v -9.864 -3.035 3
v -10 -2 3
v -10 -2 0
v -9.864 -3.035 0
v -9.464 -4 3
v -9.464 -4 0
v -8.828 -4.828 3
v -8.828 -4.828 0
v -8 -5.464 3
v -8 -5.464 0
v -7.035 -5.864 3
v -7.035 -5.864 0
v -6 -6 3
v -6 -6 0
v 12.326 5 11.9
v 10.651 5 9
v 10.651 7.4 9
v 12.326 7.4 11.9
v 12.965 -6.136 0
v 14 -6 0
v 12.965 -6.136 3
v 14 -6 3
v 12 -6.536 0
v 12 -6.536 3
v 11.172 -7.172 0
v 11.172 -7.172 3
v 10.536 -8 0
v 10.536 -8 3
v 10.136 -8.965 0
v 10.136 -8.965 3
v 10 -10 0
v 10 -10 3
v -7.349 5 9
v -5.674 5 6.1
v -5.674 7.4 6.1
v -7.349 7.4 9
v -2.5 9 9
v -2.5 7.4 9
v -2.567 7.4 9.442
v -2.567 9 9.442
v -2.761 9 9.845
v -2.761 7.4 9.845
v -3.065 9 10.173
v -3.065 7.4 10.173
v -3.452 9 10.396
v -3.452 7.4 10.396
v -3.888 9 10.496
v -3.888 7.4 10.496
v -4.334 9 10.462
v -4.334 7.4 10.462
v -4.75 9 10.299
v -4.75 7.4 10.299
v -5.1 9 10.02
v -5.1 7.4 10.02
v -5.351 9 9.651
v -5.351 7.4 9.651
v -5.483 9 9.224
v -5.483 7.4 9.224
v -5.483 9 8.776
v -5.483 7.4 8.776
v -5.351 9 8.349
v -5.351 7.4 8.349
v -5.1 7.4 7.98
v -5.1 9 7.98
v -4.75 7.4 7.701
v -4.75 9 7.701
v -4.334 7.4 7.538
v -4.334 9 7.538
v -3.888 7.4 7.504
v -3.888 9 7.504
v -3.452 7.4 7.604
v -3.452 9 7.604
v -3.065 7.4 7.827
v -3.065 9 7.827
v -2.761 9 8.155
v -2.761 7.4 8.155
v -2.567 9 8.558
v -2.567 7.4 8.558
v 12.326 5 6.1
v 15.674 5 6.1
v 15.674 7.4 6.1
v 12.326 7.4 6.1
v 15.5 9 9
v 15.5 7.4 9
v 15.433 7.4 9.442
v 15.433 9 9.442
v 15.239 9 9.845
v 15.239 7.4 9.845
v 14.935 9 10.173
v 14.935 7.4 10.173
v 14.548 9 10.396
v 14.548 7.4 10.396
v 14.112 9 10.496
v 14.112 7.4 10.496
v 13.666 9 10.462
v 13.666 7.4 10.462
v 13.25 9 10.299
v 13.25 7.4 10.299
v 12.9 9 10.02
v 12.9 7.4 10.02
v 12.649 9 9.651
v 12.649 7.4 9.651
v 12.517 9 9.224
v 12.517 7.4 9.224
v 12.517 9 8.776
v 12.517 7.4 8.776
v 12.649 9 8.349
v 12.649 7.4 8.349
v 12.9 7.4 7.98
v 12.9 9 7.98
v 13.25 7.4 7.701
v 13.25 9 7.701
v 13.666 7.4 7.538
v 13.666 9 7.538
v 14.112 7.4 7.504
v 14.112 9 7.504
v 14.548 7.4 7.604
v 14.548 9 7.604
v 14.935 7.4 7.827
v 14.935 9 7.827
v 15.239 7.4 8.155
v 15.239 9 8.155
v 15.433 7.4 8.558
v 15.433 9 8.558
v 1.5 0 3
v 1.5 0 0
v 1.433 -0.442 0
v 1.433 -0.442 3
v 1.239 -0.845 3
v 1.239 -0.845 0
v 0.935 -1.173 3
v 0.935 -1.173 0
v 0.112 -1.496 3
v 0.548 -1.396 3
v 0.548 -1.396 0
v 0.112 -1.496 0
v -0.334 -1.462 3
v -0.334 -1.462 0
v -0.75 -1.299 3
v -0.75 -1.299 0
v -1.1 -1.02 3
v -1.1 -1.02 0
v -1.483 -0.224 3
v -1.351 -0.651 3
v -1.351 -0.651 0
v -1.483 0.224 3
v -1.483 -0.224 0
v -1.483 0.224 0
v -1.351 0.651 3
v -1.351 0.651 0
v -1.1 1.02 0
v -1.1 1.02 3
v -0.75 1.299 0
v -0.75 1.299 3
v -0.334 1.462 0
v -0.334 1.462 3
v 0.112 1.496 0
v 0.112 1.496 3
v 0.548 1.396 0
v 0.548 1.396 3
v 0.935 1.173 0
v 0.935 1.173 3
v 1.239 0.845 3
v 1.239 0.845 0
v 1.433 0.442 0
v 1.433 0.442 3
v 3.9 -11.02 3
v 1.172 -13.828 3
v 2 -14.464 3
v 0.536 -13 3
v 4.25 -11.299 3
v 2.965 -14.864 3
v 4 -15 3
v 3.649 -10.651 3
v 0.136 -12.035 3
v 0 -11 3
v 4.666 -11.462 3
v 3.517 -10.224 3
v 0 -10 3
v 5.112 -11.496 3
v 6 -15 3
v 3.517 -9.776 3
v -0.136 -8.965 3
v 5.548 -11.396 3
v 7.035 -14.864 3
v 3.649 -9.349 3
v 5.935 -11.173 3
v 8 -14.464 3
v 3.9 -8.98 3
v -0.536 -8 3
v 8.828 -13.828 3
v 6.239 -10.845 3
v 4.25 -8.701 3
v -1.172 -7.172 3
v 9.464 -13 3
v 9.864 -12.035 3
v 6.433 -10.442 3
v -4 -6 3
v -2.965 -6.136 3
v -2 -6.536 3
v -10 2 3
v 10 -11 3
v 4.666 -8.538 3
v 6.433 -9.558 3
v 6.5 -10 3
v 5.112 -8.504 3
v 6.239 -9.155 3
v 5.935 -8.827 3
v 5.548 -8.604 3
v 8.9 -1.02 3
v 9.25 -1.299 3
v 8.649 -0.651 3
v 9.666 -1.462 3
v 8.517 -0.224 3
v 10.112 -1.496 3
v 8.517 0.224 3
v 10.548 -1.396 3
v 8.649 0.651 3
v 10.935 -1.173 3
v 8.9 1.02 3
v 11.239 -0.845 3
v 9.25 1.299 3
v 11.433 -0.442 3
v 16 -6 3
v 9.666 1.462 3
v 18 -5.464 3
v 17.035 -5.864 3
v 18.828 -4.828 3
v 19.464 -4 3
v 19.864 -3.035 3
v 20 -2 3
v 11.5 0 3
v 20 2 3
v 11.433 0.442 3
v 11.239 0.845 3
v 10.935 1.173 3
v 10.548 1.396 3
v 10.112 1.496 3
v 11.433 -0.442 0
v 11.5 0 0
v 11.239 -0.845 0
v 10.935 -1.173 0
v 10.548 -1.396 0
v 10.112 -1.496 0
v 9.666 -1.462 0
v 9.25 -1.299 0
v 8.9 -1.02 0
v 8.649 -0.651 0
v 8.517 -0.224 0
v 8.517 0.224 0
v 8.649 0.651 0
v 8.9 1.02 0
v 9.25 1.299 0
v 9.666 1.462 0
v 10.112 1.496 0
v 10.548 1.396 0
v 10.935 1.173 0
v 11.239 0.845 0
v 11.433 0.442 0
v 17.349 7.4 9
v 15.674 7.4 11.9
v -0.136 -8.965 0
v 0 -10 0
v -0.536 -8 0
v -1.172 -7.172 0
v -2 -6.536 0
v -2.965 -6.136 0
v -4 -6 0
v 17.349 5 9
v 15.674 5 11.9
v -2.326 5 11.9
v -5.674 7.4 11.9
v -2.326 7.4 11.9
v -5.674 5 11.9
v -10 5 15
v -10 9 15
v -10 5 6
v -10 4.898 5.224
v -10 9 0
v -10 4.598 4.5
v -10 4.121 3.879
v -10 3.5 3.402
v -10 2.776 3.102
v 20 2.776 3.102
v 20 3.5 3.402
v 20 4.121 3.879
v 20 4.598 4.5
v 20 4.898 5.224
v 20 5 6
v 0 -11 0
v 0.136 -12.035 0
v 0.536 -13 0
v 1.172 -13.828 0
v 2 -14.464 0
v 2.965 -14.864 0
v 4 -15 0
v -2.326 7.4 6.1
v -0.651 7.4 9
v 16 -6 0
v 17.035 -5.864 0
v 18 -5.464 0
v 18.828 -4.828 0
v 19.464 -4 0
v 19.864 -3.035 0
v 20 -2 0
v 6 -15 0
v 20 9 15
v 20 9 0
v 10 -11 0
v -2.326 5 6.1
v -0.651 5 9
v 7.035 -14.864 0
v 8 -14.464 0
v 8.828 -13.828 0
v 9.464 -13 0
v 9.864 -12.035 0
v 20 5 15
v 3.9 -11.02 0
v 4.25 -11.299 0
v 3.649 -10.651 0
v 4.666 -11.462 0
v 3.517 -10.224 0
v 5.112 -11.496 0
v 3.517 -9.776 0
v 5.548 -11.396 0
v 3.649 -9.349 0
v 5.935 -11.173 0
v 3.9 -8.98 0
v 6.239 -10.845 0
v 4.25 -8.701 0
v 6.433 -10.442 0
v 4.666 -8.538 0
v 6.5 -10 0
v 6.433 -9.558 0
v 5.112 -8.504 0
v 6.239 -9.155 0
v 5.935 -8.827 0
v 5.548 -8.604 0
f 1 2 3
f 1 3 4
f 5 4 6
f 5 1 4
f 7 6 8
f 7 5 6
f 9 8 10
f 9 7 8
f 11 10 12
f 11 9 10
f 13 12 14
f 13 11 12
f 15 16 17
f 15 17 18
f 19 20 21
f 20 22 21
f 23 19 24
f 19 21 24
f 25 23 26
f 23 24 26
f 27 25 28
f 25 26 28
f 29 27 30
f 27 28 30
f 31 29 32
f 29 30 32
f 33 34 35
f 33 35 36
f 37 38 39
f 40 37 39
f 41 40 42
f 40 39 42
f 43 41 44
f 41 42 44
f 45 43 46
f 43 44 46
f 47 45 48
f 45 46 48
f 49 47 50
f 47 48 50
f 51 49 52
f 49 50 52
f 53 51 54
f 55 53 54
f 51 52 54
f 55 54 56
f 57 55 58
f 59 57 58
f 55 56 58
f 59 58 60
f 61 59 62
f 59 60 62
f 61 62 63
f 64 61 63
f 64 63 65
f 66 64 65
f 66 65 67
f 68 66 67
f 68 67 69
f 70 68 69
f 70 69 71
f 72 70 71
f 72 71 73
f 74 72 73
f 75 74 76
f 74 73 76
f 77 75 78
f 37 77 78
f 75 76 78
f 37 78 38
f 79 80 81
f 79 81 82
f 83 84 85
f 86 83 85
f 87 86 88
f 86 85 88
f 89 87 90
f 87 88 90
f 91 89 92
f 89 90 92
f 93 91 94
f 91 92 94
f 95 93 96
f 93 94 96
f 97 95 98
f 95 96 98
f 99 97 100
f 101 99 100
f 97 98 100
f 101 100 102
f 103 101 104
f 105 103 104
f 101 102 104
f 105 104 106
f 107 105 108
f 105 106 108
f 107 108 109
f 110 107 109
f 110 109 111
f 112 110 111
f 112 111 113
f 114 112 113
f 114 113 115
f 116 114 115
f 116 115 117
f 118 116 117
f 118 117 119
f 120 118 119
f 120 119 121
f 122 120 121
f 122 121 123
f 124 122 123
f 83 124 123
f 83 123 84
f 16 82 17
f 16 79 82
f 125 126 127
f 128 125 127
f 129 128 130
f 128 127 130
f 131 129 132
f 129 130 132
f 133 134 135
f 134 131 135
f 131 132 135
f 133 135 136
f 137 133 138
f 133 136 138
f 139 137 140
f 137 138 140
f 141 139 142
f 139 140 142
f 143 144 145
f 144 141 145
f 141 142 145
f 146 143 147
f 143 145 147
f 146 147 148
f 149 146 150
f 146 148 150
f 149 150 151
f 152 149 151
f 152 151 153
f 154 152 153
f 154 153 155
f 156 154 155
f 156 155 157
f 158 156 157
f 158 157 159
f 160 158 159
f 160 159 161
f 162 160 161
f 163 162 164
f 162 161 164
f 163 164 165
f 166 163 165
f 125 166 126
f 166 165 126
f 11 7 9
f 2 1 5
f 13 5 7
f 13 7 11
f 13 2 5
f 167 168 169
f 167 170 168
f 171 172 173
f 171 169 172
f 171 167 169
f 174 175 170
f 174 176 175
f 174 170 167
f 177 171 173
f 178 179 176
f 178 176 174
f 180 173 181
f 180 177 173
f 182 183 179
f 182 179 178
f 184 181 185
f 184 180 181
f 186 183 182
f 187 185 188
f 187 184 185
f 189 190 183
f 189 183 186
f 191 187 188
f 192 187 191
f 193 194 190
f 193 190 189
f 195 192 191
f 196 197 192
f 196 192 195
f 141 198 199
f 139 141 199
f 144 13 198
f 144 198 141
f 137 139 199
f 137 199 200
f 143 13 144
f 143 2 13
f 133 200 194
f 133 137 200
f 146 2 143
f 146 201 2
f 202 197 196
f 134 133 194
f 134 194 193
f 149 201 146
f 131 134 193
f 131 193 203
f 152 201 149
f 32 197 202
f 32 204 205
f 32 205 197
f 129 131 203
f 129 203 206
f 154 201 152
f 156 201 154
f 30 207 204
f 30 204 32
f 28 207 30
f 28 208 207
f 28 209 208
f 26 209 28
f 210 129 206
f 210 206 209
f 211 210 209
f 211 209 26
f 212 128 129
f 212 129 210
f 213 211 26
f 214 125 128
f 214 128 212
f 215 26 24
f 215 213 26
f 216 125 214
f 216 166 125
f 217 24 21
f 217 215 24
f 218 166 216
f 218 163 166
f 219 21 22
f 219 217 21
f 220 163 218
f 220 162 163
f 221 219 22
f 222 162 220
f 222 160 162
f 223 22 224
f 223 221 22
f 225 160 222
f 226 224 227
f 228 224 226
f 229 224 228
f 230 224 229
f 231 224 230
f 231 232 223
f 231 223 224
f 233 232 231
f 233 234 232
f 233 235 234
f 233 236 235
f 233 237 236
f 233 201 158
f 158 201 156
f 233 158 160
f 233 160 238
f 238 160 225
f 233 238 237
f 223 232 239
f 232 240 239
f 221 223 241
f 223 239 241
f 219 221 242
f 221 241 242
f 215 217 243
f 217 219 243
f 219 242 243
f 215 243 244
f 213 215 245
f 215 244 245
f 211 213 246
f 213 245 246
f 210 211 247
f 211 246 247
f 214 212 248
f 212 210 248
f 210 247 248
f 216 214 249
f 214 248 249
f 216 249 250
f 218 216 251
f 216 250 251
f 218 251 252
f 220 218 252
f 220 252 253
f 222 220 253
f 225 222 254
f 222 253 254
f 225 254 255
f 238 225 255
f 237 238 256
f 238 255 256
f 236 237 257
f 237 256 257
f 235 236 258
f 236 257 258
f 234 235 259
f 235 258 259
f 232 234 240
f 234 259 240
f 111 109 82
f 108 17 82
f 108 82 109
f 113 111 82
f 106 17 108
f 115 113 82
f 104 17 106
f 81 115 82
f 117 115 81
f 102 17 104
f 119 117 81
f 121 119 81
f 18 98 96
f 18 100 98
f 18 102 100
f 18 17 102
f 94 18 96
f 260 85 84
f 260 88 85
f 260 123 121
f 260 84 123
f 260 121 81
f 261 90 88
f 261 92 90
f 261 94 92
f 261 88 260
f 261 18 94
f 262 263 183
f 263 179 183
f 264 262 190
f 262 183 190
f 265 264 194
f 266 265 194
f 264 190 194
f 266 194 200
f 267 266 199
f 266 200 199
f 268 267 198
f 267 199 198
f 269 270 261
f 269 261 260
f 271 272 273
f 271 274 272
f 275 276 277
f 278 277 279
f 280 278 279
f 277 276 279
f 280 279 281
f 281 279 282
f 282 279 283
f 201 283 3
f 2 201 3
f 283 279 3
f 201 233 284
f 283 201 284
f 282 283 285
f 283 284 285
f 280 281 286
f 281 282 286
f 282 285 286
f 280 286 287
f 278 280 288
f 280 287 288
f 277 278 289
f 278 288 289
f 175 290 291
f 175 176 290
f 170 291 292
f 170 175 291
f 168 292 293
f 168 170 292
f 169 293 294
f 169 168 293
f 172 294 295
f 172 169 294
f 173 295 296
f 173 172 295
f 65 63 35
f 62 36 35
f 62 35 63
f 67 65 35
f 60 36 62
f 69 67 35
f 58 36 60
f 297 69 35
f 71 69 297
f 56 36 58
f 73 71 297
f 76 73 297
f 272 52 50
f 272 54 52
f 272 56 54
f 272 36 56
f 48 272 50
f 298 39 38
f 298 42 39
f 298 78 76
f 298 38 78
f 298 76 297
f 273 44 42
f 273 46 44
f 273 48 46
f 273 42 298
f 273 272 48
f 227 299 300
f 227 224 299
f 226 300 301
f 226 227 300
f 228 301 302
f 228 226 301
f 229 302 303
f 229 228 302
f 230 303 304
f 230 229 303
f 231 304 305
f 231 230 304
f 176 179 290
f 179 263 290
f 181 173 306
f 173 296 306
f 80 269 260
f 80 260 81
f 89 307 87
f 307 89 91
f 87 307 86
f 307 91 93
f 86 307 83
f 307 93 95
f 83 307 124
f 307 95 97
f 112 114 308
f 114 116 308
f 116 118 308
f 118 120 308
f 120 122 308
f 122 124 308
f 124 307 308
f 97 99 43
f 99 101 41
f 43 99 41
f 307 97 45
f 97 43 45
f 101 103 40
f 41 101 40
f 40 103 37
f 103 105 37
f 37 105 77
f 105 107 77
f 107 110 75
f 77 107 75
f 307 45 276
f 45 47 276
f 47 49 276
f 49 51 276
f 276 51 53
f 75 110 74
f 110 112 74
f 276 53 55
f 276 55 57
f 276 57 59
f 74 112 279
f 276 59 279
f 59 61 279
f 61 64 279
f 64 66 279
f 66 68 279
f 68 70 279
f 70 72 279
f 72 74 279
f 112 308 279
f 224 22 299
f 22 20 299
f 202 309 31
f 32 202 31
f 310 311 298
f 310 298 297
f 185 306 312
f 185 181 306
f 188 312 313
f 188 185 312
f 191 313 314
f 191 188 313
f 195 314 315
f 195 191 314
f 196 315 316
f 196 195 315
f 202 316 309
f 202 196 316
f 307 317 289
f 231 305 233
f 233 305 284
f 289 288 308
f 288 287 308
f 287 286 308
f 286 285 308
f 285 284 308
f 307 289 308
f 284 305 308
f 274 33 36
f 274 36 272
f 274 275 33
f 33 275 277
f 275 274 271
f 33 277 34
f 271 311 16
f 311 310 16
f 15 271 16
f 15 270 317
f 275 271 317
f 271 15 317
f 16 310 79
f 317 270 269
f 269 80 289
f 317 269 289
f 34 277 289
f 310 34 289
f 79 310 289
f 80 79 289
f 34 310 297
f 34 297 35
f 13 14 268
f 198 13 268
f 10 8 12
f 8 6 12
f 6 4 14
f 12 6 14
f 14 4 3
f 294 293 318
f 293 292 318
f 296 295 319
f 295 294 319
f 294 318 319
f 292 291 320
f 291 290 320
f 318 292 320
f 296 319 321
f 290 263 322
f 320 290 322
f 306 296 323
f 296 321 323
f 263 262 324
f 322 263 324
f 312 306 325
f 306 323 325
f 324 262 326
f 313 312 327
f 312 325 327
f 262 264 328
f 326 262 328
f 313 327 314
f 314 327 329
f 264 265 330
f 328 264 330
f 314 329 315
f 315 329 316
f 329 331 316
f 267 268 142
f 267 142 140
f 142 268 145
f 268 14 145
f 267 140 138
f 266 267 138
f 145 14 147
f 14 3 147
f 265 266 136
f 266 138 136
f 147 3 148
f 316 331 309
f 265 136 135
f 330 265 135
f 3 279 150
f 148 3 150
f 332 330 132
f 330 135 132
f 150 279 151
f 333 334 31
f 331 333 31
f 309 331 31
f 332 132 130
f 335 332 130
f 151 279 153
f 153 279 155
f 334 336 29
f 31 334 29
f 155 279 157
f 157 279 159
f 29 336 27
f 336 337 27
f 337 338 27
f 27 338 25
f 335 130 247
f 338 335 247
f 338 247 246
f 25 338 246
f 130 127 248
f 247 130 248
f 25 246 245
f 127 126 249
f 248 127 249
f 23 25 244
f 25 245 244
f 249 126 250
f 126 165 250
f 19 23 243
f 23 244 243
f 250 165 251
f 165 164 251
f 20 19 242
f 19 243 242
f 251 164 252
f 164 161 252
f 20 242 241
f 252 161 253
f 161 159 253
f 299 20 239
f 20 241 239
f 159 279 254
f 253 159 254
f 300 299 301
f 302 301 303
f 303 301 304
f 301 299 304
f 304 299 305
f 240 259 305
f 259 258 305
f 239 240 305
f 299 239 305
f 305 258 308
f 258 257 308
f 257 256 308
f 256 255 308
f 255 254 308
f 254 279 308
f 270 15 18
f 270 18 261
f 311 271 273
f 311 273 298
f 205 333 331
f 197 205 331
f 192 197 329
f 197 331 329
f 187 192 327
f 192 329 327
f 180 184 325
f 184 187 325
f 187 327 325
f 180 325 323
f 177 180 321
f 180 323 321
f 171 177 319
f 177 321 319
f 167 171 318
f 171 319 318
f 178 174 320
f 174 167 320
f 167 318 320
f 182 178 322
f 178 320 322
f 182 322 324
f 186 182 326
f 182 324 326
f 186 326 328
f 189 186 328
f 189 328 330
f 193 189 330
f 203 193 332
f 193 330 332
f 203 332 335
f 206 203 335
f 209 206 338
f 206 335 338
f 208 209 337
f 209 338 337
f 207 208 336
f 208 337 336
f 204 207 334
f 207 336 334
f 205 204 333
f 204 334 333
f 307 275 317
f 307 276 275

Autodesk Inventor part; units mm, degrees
ref_plane "YZ Plane" through (0, 0, 0) normal (1, 0, 0) x (0, 1, 0)
ref_plane "XZ Plane" through (0, 0, 0) normal (0, 1, 0) x (-1, 0, 0)
ref_plane "XY Plane" through (0, 0, 0) normal (0, 0, 1) x (1, 0, 0)
sketch "Sketch1" plane through (0, 0, 0) normal (0, 0, 1) x (1, 0, 0)
  circle A0 centre (0, 0) radius 1.5
  circle A1 centre (10, 0) radius 1.5
  circle A2 centre (5, -10) radius 1.5
  line L0 (-10, 9) -> (20, 9)
  circle A3 centre (-4, -8) radius 1.5 construction
  circle A4 centre (-4, -18) radius 1.5 construction
  circle A5 centre (14, -8) radius 1.5 construction
  circle A6 centre (14, -18) radius 1.5 construction
  line L1 (-10, 9) -> (-10, -6)
  line L2 (-10, -6) -> (0, -6)
  line L3 (0, -6) -> (0, -15)
  line L4 (0, -15) -> (10, -15)
  line L5 (10, -15) -> (10, -6)
  line L6 (10, -6) -> (20, -6)
  line L7 (20, -6) -> (20, 9)
  dimension "d0" = 3
  dimension "d1" = 5
  dimension "d2" = 10
  dimension "d3" = 10
  dimension "d4" = 30
  dimension "d5" = 9
  dimension "d6" = 10
  dimension "d7" = 10
  dimension "d8" = 18
  dimension "d9" = 6
  dimension "d10" = 3
  dimension "d11" = 17
  dimension "d16" = 15
  dimension "d17" = 10
  dimension "d18" = 5
  dimension "d19" = 5
extrude "Extrusion1" add sketch "Sketch1" along normal blind 3
fillet "Fillet2" radius 4 6 edges at (0, -6, 1.5) (10, -6, 1.5) (10, -15, 1.5) (0, -15, 1.5) (-10, -6, 1.5) (20, -6, 1.5)
sketch "Sketch2" plane through (0, 0, 3) normal (0, 0, 1) x (1, 0, 0)
  line L0 (20, -2) -> (20, 9) projected
  line L1 (20, 9) -> (-10, 9) projected
  line L2 (-10, 9) -> (-10, -2) projected
  line L3 (-10, 5) -> (20, 5)
  dimension "d21" = 4
extrude "Extrusion2" add sketch "Sketch2" along normal blind 12
sketch "Sketch3" plane through (-10, 5, 3) normal (0, -1, 0) x (1, 0, 0)
  line L0 (0, 0) -> (0, 12) projected
  circle A0 centre (6, 6) radius 1.5
  circle A1 centre (24, 6) radius 1.5
  line L1 (0, -3) -> (30, -3) projected
  point P0 (10, -3)
  dimension "d24" = 18
  dimension "d25" = 6
  dimension "d26" = 9
  dimension "d27" = 3
extrude "Extrusion3" cut sketch "Sketch3" against normal up to next
sketch "Sketch4" plane through (-10, 5, 3) normal (0, -1, 0) x (1, 0, 0)
  circle A0 centre (6, 6) radius 1.5 projected
  circle A1 centre (24, 6) radius 1.5 projected
  line L0 (9.3486, 6) -> (7.6743, 3.1)
  line L1 (7.6743, 3.1) -> (4.3257, 3.1)
  line L2 (4.3257, 3.1) -> (2.6514, 6)
  line L3 (2.6514, 6) -> (4.3257, 8.9)
  line L4 (4.3257, 8.9) -> (7.6743, 8.9)
  line L5 (7.6743, 8.9) -> (9.3486, 6)
  circle A2 centre (24, 6) radius 1.5 projected
  line L6 (27.3486, 6) -> (25.6743, 3.1)
  line L7 (25.6743, 3.1) -> (22.3257, 3.1)
  line L8 (22.3257, 3.1) -> (20.6514, 6)
  line L9 (20.6514, 6) -> (22.3257, 8.9)
  line L10 (22.3257, 8.9) -> (25.6743, 8.9)
  line L11 (25.6743, 8.9) -> (27.3486, 6)
  point P0 (10, -3)
  dimension "d30" = 5.8
extrude "Extrusion4" cut sketch "Sketch4" against normal blind 2.4
fillet "Fillet3" radius 3 1 edges at (5, 5, 3)
properties part number "ChimeraMountingBlock"
